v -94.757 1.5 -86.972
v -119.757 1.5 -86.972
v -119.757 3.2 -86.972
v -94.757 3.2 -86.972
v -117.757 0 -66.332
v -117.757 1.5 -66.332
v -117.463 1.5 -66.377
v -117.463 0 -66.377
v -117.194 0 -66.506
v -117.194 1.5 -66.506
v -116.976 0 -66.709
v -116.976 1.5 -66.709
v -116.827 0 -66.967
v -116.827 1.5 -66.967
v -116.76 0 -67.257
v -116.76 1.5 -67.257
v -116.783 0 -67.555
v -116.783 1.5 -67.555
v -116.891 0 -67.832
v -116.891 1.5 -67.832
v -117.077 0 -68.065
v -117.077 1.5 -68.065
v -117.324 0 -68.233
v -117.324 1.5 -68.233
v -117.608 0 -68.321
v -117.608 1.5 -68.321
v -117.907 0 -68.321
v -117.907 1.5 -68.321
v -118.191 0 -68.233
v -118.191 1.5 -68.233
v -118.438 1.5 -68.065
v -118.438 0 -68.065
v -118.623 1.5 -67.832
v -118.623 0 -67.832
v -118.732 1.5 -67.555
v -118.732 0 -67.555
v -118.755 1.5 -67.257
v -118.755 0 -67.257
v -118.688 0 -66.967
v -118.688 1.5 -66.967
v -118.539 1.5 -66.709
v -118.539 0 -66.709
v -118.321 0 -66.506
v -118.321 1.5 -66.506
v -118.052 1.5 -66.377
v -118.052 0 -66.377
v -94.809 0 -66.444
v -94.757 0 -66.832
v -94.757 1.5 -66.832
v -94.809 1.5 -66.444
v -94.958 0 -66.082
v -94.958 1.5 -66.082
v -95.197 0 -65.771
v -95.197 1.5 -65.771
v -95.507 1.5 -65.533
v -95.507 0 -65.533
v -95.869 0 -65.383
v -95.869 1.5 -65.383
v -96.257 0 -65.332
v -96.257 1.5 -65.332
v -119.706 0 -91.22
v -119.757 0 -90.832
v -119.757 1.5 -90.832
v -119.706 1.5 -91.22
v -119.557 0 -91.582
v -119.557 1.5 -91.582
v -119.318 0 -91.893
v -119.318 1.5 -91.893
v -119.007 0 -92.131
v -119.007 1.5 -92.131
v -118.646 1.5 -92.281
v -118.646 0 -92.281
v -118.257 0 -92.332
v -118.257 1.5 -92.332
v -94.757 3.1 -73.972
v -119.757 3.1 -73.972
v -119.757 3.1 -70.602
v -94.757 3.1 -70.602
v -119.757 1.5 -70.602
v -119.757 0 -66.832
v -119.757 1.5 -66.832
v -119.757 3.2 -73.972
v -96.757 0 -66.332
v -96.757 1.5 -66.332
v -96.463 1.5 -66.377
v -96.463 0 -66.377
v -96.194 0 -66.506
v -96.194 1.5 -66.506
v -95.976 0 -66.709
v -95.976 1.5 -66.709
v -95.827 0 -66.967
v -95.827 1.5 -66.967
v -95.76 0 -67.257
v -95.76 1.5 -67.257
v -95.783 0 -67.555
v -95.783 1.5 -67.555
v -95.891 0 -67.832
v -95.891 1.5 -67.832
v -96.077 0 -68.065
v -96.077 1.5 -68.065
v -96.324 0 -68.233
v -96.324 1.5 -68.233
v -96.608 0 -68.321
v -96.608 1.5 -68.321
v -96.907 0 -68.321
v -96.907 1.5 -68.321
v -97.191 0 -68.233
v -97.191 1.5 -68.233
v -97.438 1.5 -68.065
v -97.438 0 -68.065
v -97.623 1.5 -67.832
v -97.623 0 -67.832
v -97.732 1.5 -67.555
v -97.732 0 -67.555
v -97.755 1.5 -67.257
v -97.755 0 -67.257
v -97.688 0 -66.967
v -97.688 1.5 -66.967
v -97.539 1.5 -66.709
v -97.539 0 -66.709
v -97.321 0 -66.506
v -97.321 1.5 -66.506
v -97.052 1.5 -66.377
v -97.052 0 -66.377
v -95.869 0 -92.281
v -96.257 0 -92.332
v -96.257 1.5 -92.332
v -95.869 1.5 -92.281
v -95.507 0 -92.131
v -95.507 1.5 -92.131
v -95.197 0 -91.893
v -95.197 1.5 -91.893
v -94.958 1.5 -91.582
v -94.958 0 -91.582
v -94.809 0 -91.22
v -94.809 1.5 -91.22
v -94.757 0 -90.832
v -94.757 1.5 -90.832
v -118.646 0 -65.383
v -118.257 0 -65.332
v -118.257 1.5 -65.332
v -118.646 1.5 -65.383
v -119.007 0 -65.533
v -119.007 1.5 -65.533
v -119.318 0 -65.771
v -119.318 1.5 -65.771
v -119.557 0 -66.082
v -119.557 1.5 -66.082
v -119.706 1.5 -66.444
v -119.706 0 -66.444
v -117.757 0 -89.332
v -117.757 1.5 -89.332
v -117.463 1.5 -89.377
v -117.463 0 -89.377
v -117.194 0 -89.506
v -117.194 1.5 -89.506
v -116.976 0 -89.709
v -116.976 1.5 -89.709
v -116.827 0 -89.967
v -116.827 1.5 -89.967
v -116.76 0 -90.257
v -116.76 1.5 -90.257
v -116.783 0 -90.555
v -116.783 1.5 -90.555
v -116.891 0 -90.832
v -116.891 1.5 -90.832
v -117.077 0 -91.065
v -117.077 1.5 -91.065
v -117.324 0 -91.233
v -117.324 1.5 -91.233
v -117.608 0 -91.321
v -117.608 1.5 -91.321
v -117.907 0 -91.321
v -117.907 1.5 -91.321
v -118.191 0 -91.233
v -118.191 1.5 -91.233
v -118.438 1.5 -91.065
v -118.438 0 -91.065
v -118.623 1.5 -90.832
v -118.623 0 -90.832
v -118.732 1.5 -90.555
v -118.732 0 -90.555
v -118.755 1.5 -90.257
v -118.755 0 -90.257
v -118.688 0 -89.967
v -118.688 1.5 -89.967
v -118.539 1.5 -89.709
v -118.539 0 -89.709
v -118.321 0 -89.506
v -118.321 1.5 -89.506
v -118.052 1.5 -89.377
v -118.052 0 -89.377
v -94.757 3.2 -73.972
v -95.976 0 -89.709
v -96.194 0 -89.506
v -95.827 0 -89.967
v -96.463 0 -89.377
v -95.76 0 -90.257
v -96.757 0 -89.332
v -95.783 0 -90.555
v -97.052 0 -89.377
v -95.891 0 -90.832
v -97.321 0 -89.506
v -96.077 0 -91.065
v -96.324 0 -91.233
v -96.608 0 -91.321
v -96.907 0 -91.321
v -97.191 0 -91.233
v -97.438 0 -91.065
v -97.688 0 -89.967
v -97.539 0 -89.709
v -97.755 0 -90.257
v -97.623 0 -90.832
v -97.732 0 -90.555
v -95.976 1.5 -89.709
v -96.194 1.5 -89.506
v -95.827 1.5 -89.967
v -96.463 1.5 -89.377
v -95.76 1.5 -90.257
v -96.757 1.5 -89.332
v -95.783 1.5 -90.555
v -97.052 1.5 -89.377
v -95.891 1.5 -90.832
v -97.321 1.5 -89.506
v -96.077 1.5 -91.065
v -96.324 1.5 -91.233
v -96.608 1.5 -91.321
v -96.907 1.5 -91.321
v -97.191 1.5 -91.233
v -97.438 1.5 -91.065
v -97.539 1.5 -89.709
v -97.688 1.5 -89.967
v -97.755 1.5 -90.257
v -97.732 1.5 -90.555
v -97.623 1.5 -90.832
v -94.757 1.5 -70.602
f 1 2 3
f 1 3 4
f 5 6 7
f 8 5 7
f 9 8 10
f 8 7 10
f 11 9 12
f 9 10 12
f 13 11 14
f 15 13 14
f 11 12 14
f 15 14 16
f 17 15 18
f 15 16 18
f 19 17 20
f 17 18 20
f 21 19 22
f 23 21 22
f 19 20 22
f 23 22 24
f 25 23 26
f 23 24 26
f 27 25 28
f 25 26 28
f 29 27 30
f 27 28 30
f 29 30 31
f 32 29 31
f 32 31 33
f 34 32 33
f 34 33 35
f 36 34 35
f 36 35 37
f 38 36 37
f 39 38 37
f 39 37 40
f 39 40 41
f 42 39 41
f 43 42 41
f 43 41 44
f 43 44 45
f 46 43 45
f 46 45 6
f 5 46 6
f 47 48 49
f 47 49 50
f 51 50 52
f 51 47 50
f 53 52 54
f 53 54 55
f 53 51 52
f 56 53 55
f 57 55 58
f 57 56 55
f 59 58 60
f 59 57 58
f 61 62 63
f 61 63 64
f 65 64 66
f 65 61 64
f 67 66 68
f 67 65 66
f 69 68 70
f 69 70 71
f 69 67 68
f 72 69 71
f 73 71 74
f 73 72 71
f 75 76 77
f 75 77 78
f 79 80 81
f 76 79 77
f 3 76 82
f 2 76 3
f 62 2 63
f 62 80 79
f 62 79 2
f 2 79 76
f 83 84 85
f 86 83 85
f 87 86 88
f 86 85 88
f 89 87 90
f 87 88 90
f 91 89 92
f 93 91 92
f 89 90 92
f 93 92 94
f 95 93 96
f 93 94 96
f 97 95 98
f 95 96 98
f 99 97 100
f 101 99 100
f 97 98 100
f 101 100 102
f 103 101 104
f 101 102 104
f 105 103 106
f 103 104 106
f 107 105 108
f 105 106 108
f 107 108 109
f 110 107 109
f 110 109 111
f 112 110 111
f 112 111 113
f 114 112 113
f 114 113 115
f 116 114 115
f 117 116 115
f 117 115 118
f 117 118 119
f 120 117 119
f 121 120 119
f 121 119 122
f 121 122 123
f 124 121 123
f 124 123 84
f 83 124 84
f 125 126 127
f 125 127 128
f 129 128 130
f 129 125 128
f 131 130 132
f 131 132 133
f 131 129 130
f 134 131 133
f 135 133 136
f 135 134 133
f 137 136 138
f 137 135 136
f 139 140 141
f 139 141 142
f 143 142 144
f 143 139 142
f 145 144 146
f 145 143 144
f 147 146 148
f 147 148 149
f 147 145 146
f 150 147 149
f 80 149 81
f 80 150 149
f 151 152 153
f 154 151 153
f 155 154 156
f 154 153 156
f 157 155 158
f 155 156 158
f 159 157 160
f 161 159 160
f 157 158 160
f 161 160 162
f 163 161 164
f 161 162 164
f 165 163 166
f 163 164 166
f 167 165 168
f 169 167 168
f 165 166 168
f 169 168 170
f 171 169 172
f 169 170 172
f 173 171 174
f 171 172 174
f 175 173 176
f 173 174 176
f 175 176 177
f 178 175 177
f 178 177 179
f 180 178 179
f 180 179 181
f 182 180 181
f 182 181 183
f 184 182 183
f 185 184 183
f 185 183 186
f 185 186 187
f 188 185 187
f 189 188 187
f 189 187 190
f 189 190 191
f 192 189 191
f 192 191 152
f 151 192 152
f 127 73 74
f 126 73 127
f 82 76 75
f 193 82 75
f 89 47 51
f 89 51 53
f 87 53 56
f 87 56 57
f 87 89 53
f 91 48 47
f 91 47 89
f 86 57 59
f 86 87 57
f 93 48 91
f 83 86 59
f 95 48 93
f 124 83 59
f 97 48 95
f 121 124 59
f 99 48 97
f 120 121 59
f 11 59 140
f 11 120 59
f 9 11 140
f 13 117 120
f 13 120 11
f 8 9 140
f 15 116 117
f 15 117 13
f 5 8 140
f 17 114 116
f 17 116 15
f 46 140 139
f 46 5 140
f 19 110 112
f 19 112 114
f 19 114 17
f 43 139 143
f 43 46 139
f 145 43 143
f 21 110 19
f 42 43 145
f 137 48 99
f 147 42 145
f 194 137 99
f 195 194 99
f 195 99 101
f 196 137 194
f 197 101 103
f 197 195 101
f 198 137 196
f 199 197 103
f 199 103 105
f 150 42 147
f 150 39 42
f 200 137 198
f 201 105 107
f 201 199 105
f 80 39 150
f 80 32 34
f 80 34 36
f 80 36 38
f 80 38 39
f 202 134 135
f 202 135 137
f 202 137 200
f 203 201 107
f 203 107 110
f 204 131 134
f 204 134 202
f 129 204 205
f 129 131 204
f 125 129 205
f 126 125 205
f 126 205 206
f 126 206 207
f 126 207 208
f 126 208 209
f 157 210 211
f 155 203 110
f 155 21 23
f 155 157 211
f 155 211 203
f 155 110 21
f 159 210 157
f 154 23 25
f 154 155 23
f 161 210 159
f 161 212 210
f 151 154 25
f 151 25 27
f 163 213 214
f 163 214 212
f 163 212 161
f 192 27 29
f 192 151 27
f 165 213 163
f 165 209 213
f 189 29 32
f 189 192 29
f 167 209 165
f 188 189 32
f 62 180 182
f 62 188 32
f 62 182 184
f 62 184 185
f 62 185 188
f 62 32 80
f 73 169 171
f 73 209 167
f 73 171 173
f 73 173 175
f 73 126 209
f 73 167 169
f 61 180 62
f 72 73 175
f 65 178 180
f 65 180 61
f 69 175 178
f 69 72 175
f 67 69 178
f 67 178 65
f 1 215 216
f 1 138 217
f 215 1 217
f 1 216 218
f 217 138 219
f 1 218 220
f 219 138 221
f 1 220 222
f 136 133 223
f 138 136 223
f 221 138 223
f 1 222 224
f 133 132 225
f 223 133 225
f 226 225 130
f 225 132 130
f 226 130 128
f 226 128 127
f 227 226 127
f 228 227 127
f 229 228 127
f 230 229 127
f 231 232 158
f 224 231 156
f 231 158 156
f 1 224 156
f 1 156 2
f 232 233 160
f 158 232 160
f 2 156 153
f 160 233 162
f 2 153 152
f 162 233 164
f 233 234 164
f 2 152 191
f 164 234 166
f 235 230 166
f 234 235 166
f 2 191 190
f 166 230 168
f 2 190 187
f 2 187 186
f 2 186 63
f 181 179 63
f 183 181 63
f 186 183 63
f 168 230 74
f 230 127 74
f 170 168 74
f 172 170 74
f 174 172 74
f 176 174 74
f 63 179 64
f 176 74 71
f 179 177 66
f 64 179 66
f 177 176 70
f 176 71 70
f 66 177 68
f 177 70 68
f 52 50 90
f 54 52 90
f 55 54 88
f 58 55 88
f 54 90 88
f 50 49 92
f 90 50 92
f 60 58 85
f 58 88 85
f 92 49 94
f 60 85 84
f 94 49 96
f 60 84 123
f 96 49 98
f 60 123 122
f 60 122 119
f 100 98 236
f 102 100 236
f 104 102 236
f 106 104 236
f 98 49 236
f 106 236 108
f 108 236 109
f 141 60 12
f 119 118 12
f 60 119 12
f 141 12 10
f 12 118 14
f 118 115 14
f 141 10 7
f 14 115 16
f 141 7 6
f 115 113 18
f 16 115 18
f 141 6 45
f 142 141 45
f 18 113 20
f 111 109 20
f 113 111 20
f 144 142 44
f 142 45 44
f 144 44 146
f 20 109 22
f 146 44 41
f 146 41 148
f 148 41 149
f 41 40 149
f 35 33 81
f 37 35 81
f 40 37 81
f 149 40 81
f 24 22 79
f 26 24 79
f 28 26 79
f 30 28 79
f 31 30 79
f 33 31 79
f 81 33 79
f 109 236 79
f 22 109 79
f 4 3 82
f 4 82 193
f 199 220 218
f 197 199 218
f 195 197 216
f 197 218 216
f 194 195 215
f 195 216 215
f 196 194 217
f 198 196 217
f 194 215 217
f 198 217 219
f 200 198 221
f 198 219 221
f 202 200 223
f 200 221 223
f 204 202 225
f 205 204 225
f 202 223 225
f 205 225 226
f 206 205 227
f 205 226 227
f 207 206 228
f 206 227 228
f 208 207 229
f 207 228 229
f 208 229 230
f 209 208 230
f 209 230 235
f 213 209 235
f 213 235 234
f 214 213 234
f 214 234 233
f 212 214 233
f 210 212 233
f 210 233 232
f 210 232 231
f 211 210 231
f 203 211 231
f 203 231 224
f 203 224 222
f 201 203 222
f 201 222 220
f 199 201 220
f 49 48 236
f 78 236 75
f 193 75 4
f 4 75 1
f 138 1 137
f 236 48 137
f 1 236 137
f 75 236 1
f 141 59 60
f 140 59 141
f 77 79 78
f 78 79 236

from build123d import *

# Parameters (mm, degrees)
EXTRUDE_1_DEPTH     = 1.5
SKETCH_3_R          = 1
CUT_EXTRUDE_1_DEPTH = 152.226038202
SKETCH_4_W          = 25
SKETCH_4_H          = 16.37
EXTRUDE_2_DEPTH     = 1.6
SKETCH_5_W          = 25
SKETCH_5_H          = 13
EXTRUDE_3_DEPTH     = 0.1


with BuildPart() as part:
    # 草图2 → 凸台-拉伸1 (new body)
    with BuildSketch(Plane(origin=(0, 0, 0), x_dir=(1, 0, 0), z_dir=(0, 1, 0))):
        with BuildLine():
            Line((-118.257462687, 92.332089552), (-96.257462687, 92.332089552))
            ThreePointArc((-96.257462687, 92.332089552), (-95.196802515, 91.892749724), (-94.757462687, 90.832089552))
            Line((-94.757462687, 90.832089552), (-94.757462687, 66.832089552))
            ThreePointArc((-94.757462687, 66.832089552), (-95.196802515, 65.77142938), (-96.257462687, 65.332089552))
            Line((-96.257462687, 65.332089552), (-118.257462687, 65.332089552))
            ThreePointArc((-118.257462687, 65.332089552), (-119.318122858, 65.77142938), (-119.757462687, 66.832089552))
            Line((-119.757462687, 66.832089552), (-119.757462687, 90.832089552))
            ThreePointArc((-119.757462687, 90.832089552), (-119.318122858, 91.892749724), (-118.257462687, 92.332089552))
        make_face()
    extrude(amount=EXTRUDE_1_DEPTH)

    # 草图3 → 切除-拉伸1 (cut, through all)
    with BuildSketch(Plane(origin=(0, 1.5, 0), x_dir=(1, 0, 0), z_dir=(0, 1, 0))):
        with Locations(Location((-117.757462687, 90.332089552, 0), (0, 0, 270))):
            Circle(SKETCH_3_R)
        with Locations(Location((-96.757462687, 90.332089552, 0), (0, 0, 270))):
            Circle(SKETCH_3_R)
        with Locations(Location((-96.757462687, 67.332089552, 0), (0, 0, 270))):
            Circle(SKETCH_3_R)
        with Locations(Location((-117.757462687, 67.332089552, 0), (0, 0, 270))):
            Circle(SKETCH_3_R)
    extrude(amount=-CUT_EXTRUDE_1_DEPTH, mode=Mode.SUBTRACT)

    # 草图4 → 凸台-拉伸2 (add)
    with BuildSketch(Plane(origin=(0, 1.5, 0), x_dir=(1, 0, 0), z_dir=(0, 1, 0))):
        with Locations((-107.257462687, 78.787089552)):
            Rectangle(SKETCH_4_W, SKETCH_4_H)
    extrude(amount=EXTRUDE_2_DEPTH)

    # 草图5 → 凸台-拉伸3 (add)
    with BuildSketch(Plane(origin=(0, 3.1, 0), x_dir=(1, 0, 0), z_dir=(0, 1, 0))):
        with Locations((-107.257462687, 80.472089552)):
            Rectangle(SKETCH_5_W, SKETCH_5_H)
    extrude(amount=EXTRUDE_3_DEPTH)


solid = part.part
